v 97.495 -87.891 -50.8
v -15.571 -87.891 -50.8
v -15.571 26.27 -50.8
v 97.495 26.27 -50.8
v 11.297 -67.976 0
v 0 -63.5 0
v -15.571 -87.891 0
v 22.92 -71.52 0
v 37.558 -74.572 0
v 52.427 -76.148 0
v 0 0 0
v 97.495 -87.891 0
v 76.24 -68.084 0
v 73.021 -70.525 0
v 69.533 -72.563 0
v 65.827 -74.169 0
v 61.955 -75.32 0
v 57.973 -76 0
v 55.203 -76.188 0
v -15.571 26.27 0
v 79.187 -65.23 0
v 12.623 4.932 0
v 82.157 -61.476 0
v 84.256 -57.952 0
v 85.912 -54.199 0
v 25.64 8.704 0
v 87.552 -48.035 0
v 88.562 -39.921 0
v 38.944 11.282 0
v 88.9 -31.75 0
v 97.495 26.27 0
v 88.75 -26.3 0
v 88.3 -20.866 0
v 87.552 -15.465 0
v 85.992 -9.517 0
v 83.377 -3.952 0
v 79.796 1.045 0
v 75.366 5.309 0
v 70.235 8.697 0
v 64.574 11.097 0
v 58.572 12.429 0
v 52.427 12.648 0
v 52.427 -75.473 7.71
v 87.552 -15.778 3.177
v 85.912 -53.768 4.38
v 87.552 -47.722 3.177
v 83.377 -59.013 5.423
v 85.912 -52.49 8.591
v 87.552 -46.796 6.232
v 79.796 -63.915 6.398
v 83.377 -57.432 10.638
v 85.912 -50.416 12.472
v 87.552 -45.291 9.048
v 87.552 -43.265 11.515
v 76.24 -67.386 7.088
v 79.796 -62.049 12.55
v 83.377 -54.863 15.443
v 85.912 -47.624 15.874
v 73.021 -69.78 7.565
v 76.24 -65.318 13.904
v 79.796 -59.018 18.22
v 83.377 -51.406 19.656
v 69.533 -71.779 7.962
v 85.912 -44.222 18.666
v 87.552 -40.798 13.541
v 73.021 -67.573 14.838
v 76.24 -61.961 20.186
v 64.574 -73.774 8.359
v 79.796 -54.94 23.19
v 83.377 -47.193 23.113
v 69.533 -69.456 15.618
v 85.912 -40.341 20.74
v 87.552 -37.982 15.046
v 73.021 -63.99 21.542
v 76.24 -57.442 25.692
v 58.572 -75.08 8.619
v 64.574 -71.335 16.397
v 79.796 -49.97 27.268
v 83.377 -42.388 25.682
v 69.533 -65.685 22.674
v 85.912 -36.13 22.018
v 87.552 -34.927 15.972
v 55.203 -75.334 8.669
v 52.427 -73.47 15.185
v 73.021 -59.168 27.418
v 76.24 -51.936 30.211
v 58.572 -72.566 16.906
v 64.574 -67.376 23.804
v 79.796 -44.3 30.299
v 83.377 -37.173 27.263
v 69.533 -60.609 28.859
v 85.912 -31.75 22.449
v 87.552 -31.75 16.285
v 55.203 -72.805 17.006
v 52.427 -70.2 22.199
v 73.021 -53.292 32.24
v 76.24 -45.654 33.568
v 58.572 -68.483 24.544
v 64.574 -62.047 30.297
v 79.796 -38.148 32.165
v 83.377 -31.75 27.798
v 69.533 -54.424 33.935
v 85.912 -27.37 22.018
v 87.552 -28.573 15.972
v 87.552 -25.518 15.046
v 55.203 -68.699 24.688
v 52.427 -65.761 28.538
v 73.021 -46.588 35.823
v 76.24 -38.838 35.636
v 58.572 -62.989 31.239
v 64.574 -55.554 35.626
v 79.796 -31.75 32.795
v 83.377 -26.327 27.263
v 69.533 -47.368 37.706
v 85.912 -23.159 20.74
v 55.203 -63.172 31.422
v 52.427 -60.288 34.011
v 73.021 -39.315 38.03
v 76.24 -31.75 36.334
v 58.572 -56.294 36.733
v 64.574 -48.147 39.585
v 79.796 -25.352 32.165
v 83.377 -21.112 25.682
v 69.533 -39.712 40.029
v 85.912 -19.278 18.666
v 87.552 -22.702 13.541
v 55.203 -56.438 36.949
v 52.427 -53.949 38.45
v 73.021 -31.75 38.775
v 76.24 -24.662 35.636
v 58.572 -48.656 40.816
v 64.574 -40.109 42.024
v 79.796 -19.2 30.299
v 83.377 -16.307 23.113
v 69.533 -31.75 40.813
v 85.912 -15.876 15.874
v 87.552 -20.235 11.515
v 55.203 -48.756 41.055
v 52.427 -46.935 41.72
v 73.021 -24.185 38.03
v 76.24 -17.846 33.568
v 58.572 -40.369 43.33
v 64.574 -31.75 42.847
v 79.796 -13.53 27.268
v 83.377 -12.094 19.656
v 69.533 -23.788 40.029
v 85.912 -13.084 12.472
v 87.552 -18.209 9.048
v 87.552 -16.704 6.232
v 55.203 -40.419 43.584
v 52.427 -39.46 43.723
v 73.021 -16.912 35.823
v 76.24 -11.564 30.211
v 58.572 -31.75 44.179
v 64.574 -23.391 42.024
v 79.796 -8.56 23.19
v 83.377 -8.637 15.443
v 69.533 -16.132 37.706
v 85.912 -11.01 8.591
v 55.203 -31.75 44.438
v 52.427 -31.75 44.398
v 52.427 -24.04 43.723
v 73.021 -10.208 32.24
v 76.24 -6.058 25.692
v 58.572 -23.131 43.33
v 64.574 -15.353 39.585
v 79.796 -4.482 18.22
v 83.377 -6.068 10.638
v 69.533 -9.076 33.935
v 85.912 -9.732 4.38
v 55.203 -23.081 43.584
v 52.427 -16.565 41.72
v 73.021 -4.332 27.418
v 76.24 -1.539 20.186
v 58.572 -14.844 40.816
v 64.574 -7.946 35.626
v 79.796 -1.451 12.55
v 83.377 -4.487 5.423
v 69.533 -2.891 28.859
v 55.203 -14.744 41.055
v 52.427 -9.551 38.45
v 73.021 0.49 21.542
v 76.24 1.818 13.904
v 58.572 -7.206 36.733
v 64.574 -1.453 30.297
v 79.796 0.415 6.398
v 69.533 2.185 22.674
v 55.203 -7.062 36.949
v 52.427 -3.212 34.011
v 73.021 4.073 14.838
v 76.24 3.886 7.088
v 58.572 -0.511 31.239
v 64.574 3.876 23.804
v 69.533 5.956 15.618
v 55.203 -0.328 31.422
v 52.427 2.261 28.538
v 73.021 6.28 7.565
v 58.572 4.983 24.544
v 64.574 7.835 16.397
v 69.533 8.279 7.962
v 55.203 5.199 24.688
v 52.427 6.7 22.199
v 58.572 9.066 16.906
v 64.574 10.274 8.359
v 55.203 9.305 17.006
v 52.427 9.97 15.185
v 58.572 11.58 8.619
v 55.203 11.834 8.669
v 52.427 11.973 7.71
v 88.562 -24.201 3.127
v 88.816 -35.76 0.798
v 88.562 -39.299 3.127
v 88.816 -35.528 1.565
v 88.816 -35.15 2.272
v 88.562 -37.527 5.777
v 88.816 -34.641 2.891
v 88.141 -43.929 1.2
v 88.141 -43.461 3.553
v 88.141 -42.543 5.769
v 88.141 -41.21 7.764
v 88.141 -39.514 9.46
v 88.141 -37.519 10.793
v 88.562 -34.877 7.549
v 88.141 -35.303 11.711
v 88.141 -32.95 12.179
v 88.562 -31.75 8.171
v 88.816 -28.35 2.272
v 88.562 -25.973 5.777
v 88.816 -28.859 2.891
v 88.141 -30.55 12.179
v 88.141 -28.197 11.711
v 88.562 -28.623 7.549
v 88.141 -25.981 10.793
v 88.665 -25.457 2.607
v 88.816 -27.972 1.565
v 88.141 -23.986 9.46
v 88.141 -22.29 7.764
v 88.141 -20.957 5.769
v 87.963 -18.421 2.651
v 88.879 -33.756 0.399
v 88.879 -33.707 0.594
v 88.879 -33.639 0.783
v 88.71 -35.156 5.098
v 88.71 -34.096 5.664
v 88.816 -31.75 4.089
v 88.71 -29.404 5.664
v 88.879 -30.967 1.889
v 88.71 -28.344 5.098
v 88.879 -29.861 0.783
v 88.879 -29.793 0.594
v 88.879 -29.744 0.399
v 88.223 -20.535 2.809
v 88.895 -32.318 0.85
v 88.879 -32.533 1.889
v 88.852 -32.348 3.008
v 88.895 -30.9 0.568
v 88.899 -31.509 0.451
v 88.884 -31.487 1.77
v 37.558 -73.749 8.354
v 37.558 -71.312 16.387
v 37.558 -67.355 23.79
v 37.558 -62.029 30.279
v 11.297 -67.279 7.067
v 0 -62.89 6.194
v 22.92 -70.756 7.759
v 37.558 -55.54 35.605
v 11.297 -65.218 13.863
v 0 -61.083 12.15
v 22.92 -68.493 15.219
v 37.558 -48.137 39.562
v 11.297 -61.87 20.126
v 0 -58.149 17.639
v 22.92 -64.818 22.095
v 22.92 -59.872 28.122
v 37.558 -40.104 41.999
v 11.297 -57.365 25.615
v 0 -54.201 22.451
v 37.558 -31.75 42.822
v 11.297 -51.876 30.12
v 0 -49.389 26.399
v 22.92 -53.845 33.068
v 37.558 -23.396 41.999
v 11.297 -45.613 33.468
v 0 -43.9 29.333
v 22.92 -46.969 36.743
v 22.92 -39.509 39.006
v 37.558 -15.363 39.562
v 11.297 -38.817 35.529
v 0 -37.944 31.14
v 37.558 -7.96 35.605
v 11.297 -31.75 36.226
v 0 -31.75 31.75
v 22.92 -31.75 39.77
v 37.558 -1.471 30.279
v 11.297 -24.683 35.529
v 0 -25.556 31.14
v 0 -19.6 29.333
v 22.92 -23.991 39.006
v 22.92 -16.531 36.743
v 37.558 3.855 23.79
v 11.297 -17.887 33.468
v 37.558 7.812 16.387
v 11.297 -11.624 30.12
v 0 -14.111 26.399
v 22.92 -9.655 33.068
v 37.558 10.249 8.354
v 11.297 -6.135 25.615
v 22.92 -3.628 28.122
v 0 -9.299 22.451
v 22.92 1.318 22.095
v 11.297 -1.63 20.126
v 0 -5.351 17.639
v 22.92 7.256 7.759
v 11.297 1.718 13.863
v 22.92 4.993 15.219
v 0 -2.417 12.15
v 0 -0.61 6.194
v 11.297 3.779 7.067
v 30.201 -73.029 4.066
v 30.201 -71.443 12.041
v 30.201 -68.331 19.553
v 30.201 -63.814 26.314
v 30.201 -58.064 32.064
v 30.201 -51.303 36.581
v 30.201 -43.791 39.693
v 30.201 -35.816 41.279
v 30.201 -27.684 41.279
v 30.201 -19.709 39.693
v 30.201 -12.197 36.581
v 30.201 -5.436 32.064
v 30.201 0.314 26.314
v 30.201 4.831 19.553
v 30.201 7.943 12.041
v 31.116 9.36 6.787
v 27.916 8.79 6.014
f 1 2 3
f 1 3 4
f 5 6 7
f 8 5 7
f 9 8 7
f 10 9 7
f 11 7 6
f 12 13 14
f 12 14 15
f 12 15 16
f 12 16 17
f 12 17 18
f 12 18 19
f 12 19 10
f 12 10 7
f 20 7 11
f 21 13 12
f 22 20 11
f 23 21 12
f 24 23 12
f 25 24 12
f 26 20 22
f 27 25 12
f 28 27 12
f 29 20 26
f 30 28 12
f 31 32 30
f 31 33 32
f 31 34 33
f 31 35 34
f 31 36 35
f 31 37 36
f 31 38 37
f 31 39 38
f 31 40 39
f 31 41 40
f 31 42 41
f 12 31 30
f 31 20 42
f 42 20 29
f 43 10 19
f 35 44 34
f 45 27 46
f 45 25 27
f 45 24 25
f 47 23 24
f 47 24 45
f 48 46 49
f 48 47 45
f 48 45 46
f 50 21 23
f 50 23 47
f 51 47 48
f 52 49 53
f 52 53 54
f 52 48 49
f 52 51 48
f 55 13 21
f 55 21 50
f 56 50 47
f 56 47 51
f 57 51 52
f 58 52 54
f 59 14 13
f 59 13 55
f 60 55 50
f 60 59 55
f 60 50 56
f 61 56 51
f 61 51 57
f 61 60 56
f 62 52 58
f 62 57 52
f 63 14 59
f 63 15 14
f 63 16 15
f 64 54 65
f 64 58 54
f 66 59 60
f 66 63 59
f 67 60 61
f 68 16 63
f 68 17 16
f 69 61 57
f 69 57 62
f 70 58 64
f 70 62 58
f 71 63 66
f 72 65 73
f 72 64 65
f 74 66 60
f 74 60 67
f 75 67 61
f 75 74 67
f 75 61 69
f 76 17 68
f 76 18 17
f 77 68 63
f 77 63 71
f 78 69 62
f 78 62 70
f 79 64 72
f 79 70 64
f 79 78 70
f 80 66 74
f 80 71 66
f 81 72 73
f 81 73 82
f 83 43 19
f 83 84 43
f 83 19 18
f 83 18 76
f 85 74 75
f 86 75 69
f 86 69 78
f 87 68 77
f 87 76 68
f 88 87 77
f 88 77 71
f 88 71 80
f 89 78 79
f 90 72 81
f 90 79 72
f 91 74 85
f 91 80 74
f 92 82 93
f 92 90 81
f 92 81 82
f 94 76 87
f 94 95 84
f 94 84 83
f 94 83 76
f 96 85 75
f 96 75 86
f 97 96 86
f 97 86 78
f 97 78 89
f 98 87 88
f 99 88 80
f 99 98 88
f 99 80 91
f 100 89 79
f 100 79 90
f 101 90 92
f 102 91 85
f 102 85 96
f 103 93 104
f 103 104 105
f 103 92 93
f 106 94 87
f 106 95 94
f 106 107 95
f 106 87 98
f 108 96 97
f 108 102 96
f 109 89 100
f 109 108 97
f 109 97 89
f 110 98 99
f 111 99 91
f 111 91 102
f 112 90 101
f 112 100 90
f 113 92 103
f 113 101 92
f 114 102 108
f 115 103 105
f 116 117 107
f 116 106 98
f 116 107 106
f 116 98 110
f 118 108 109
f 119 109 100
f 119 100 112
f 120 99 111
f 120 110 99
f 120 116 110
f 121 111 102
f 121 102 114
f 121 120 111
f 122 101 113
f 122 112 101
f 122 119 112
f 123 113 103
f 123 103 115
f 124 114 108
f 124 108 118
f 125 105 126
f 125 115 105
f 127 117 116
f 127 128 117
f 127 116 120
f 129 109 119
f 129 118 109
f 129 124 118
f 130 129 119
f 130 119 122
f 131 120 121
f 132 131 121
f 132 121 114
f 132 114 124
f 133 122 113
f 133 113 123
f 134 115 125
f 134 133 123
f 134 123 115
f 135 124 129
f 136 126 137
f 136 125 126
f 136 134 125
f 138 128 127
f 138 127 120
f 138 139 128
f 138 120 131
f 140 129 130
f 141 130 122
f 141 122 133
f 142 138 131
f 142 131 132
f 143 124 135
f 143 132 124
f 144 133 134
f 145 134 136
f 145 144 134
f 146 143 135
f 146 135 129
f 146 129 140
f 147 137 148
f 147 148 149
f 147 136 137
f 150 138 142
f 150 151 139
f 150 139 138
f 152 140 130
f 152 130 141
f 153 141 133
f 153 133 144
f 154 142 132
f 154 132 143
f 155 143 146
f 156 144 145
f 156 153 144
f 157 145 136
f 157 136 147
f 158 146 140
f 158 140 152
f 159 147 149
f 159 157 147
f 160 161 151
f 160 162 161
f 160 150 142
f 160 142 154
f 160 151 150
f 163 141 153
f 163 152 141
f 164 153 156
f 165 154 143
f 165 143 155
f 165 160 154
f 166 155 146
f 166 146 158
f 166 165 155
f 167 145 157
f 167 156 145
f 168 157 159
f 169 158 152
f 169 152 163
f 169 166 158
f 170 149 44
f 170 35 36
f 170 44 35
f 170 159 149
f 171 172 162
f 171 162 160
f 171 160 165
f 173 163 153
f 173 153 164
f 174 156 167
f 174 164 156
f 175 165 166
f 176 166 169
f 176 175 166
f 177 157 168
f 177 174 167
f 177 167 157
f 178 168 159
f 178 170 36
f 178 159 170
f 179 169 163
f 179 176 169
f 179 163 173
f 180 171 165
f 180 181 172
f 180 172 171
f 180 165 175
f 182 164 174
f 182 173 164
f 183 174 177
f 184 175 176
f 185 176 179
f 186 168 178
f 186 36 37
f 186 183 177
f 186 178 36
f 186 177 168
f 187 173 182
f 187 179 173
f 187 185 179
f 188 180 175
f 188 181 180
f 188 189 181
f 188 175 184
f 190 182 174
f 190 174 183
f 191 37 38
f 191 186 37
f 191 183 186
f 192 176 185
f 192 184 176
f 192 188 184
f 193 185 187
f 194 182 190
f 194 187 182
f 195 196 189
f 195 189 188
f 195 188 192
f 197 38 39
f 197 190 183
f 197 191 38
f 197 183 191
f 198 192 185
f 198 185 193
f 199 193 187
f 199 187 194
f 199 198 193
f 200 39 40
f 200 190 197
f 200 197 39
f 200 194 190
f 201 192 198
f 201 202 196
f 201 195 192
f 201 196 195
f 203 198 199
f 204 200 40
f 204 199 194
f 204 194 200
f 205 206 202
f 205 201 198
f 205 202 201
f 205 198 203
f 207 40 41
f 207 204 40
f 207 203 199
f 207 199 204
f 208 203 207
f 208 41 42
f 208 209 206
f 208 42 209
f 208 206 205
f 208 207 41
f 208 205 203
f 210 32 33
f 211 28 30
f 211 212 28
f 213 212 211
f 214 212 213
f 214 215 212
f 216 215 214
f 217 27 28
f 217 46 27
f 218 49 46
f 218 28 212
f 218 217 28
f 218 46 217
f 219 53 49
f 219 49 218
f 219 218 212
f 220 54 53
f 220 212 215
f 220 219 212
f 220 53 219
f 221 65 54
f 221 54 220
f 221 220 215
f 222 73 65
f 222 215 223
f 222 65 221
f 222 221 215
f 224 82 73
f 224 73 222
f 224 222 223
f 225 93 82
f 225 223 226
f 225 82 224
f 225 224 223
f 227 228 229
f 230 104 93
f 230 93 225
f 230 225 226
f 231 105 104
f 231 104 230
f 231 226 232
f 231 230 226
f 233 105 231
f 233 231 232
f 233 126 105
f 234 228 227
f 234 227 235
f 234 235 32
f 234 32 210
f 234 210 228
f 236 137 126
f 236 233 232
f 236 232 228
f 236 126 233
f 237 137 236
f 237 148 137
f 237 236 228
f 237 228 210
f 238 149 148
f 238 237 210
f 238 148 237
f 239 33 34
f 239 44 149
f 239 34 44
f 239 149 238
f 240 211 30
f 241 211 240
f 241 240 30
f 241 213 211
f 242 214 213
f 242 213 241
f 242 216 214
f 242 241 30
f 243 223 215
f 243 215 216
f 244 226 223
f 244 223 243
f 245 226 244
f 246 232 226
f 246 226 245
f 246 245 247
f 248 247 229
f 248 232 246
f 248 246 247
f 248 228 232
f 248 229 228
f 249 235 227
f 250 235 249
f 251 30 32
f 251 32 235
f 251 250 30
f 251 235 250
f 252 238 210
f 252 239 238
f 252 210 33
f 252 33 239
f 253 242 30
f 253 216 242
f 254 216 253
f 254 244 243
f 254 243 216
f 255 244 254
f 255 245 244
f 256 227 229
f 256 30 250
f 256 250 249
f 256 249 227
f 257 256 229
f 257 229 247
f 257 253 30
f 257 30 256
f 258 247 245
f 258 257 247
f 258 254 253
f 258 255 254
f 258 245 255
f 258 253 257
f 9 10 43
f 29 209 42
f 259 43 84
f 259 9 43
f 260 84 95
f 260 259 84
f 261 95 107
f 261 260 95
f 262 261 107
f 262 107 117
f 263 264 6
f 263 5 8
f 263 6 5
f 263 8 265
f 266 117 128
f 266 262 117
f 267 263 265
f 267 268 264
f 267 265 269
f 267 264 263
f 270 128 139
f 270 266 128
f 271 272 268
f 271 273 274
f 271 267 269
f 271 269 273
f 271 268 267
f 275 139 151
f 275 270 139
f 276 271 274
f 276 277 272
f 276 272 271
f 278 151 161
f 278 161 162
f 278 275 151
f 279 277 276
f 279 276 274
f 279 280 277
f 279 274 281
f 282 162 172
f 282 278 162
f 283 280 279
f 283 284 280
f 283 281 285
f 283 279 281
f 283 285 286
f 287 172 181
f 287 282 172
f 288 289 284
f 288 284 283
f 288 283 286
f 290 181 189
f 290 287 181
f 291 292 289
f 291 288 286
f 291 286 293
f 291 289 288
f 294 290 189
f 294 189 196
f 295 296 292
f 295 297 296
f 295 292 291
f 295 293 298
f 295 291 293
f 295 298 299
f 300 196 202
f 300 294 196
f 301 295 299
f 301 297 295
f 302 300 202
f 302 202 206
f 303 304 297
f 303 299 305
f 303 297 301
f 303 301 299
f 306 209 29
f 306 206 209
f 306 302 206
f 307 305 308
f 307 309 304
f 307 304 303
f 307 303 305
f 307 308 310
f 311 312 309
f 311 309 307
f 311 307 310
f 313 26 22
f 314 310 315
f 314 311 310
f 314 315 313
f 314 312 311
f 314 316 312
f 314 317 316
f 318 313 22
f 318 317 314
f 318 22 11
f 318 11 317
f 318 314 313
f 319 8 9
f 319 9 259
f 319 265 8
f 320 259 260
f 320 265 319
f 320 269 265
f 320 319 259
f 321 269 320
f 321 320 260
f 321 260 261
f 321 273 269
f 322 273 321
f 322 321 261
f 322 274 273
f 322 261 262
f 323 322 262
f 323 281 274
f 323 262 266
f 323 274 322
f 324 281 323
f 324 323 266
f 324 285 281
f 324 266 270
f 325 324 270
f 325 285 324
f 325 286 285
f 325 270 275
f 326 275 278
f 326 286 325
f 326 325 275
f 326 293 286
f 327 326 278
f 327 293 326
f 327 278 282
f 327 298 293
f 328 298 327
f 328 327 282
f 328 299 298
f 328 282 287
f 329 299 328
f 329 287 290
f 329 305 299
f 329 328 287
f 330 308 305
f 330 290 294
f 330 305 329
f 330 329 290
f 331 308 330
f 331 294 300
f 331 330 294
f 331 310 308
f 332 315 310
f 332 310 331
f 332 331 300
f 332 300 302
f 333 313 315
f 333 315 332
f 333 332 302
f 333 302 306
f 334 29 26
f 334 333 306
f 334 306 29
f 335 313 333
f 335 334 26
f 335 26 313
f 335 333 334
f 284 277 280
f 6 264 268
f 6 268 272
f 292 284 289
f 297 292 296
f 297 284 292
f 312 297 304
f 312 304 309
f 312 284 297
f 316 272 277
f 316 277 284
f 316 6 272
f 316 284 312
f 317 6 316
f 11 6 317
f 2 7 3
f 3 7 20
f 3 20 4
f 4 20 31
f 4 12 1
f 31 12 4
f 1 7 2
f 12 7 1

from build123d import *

# Parameters (mm, degrees)
F2_W     = 113.065446
F2_H     = 114.160227
F3_DEPTH = 50.8


with BuildPart() as f1:
    # F0 (on Top) → F1 (revolve)
    with BuildSketch(Plane.XY):
        with BuildLine():
            Line((0, -31.75), (88.9, -31.75))
            ThreePointArc((88.9, -31.75), (88.56236, -23.579488), (87.551741, -15.464692))
            ThreePointArc((87.551741, -15.464692), (75.365793, 5.308771), (52.427336, 12.647797))
            ThreePointArc((52.427336, 12.647797), (25.639597, 8.703524), (0, 0))
            Line((0, 0), (0, -31.75))
        make_face()
    revolve(axis=Axis((44.45, -31.75, 0), (-1, 0, 0)))

    # F2 (on Top) → F3 (join)
    with BuildSketch(Plane.XY):
        with Locations((40.961946, -30.810474)):
            Rectangle(F2_W, F2_H)
    extrude(amount=-F3_DEPTH)


solid = f1.part
